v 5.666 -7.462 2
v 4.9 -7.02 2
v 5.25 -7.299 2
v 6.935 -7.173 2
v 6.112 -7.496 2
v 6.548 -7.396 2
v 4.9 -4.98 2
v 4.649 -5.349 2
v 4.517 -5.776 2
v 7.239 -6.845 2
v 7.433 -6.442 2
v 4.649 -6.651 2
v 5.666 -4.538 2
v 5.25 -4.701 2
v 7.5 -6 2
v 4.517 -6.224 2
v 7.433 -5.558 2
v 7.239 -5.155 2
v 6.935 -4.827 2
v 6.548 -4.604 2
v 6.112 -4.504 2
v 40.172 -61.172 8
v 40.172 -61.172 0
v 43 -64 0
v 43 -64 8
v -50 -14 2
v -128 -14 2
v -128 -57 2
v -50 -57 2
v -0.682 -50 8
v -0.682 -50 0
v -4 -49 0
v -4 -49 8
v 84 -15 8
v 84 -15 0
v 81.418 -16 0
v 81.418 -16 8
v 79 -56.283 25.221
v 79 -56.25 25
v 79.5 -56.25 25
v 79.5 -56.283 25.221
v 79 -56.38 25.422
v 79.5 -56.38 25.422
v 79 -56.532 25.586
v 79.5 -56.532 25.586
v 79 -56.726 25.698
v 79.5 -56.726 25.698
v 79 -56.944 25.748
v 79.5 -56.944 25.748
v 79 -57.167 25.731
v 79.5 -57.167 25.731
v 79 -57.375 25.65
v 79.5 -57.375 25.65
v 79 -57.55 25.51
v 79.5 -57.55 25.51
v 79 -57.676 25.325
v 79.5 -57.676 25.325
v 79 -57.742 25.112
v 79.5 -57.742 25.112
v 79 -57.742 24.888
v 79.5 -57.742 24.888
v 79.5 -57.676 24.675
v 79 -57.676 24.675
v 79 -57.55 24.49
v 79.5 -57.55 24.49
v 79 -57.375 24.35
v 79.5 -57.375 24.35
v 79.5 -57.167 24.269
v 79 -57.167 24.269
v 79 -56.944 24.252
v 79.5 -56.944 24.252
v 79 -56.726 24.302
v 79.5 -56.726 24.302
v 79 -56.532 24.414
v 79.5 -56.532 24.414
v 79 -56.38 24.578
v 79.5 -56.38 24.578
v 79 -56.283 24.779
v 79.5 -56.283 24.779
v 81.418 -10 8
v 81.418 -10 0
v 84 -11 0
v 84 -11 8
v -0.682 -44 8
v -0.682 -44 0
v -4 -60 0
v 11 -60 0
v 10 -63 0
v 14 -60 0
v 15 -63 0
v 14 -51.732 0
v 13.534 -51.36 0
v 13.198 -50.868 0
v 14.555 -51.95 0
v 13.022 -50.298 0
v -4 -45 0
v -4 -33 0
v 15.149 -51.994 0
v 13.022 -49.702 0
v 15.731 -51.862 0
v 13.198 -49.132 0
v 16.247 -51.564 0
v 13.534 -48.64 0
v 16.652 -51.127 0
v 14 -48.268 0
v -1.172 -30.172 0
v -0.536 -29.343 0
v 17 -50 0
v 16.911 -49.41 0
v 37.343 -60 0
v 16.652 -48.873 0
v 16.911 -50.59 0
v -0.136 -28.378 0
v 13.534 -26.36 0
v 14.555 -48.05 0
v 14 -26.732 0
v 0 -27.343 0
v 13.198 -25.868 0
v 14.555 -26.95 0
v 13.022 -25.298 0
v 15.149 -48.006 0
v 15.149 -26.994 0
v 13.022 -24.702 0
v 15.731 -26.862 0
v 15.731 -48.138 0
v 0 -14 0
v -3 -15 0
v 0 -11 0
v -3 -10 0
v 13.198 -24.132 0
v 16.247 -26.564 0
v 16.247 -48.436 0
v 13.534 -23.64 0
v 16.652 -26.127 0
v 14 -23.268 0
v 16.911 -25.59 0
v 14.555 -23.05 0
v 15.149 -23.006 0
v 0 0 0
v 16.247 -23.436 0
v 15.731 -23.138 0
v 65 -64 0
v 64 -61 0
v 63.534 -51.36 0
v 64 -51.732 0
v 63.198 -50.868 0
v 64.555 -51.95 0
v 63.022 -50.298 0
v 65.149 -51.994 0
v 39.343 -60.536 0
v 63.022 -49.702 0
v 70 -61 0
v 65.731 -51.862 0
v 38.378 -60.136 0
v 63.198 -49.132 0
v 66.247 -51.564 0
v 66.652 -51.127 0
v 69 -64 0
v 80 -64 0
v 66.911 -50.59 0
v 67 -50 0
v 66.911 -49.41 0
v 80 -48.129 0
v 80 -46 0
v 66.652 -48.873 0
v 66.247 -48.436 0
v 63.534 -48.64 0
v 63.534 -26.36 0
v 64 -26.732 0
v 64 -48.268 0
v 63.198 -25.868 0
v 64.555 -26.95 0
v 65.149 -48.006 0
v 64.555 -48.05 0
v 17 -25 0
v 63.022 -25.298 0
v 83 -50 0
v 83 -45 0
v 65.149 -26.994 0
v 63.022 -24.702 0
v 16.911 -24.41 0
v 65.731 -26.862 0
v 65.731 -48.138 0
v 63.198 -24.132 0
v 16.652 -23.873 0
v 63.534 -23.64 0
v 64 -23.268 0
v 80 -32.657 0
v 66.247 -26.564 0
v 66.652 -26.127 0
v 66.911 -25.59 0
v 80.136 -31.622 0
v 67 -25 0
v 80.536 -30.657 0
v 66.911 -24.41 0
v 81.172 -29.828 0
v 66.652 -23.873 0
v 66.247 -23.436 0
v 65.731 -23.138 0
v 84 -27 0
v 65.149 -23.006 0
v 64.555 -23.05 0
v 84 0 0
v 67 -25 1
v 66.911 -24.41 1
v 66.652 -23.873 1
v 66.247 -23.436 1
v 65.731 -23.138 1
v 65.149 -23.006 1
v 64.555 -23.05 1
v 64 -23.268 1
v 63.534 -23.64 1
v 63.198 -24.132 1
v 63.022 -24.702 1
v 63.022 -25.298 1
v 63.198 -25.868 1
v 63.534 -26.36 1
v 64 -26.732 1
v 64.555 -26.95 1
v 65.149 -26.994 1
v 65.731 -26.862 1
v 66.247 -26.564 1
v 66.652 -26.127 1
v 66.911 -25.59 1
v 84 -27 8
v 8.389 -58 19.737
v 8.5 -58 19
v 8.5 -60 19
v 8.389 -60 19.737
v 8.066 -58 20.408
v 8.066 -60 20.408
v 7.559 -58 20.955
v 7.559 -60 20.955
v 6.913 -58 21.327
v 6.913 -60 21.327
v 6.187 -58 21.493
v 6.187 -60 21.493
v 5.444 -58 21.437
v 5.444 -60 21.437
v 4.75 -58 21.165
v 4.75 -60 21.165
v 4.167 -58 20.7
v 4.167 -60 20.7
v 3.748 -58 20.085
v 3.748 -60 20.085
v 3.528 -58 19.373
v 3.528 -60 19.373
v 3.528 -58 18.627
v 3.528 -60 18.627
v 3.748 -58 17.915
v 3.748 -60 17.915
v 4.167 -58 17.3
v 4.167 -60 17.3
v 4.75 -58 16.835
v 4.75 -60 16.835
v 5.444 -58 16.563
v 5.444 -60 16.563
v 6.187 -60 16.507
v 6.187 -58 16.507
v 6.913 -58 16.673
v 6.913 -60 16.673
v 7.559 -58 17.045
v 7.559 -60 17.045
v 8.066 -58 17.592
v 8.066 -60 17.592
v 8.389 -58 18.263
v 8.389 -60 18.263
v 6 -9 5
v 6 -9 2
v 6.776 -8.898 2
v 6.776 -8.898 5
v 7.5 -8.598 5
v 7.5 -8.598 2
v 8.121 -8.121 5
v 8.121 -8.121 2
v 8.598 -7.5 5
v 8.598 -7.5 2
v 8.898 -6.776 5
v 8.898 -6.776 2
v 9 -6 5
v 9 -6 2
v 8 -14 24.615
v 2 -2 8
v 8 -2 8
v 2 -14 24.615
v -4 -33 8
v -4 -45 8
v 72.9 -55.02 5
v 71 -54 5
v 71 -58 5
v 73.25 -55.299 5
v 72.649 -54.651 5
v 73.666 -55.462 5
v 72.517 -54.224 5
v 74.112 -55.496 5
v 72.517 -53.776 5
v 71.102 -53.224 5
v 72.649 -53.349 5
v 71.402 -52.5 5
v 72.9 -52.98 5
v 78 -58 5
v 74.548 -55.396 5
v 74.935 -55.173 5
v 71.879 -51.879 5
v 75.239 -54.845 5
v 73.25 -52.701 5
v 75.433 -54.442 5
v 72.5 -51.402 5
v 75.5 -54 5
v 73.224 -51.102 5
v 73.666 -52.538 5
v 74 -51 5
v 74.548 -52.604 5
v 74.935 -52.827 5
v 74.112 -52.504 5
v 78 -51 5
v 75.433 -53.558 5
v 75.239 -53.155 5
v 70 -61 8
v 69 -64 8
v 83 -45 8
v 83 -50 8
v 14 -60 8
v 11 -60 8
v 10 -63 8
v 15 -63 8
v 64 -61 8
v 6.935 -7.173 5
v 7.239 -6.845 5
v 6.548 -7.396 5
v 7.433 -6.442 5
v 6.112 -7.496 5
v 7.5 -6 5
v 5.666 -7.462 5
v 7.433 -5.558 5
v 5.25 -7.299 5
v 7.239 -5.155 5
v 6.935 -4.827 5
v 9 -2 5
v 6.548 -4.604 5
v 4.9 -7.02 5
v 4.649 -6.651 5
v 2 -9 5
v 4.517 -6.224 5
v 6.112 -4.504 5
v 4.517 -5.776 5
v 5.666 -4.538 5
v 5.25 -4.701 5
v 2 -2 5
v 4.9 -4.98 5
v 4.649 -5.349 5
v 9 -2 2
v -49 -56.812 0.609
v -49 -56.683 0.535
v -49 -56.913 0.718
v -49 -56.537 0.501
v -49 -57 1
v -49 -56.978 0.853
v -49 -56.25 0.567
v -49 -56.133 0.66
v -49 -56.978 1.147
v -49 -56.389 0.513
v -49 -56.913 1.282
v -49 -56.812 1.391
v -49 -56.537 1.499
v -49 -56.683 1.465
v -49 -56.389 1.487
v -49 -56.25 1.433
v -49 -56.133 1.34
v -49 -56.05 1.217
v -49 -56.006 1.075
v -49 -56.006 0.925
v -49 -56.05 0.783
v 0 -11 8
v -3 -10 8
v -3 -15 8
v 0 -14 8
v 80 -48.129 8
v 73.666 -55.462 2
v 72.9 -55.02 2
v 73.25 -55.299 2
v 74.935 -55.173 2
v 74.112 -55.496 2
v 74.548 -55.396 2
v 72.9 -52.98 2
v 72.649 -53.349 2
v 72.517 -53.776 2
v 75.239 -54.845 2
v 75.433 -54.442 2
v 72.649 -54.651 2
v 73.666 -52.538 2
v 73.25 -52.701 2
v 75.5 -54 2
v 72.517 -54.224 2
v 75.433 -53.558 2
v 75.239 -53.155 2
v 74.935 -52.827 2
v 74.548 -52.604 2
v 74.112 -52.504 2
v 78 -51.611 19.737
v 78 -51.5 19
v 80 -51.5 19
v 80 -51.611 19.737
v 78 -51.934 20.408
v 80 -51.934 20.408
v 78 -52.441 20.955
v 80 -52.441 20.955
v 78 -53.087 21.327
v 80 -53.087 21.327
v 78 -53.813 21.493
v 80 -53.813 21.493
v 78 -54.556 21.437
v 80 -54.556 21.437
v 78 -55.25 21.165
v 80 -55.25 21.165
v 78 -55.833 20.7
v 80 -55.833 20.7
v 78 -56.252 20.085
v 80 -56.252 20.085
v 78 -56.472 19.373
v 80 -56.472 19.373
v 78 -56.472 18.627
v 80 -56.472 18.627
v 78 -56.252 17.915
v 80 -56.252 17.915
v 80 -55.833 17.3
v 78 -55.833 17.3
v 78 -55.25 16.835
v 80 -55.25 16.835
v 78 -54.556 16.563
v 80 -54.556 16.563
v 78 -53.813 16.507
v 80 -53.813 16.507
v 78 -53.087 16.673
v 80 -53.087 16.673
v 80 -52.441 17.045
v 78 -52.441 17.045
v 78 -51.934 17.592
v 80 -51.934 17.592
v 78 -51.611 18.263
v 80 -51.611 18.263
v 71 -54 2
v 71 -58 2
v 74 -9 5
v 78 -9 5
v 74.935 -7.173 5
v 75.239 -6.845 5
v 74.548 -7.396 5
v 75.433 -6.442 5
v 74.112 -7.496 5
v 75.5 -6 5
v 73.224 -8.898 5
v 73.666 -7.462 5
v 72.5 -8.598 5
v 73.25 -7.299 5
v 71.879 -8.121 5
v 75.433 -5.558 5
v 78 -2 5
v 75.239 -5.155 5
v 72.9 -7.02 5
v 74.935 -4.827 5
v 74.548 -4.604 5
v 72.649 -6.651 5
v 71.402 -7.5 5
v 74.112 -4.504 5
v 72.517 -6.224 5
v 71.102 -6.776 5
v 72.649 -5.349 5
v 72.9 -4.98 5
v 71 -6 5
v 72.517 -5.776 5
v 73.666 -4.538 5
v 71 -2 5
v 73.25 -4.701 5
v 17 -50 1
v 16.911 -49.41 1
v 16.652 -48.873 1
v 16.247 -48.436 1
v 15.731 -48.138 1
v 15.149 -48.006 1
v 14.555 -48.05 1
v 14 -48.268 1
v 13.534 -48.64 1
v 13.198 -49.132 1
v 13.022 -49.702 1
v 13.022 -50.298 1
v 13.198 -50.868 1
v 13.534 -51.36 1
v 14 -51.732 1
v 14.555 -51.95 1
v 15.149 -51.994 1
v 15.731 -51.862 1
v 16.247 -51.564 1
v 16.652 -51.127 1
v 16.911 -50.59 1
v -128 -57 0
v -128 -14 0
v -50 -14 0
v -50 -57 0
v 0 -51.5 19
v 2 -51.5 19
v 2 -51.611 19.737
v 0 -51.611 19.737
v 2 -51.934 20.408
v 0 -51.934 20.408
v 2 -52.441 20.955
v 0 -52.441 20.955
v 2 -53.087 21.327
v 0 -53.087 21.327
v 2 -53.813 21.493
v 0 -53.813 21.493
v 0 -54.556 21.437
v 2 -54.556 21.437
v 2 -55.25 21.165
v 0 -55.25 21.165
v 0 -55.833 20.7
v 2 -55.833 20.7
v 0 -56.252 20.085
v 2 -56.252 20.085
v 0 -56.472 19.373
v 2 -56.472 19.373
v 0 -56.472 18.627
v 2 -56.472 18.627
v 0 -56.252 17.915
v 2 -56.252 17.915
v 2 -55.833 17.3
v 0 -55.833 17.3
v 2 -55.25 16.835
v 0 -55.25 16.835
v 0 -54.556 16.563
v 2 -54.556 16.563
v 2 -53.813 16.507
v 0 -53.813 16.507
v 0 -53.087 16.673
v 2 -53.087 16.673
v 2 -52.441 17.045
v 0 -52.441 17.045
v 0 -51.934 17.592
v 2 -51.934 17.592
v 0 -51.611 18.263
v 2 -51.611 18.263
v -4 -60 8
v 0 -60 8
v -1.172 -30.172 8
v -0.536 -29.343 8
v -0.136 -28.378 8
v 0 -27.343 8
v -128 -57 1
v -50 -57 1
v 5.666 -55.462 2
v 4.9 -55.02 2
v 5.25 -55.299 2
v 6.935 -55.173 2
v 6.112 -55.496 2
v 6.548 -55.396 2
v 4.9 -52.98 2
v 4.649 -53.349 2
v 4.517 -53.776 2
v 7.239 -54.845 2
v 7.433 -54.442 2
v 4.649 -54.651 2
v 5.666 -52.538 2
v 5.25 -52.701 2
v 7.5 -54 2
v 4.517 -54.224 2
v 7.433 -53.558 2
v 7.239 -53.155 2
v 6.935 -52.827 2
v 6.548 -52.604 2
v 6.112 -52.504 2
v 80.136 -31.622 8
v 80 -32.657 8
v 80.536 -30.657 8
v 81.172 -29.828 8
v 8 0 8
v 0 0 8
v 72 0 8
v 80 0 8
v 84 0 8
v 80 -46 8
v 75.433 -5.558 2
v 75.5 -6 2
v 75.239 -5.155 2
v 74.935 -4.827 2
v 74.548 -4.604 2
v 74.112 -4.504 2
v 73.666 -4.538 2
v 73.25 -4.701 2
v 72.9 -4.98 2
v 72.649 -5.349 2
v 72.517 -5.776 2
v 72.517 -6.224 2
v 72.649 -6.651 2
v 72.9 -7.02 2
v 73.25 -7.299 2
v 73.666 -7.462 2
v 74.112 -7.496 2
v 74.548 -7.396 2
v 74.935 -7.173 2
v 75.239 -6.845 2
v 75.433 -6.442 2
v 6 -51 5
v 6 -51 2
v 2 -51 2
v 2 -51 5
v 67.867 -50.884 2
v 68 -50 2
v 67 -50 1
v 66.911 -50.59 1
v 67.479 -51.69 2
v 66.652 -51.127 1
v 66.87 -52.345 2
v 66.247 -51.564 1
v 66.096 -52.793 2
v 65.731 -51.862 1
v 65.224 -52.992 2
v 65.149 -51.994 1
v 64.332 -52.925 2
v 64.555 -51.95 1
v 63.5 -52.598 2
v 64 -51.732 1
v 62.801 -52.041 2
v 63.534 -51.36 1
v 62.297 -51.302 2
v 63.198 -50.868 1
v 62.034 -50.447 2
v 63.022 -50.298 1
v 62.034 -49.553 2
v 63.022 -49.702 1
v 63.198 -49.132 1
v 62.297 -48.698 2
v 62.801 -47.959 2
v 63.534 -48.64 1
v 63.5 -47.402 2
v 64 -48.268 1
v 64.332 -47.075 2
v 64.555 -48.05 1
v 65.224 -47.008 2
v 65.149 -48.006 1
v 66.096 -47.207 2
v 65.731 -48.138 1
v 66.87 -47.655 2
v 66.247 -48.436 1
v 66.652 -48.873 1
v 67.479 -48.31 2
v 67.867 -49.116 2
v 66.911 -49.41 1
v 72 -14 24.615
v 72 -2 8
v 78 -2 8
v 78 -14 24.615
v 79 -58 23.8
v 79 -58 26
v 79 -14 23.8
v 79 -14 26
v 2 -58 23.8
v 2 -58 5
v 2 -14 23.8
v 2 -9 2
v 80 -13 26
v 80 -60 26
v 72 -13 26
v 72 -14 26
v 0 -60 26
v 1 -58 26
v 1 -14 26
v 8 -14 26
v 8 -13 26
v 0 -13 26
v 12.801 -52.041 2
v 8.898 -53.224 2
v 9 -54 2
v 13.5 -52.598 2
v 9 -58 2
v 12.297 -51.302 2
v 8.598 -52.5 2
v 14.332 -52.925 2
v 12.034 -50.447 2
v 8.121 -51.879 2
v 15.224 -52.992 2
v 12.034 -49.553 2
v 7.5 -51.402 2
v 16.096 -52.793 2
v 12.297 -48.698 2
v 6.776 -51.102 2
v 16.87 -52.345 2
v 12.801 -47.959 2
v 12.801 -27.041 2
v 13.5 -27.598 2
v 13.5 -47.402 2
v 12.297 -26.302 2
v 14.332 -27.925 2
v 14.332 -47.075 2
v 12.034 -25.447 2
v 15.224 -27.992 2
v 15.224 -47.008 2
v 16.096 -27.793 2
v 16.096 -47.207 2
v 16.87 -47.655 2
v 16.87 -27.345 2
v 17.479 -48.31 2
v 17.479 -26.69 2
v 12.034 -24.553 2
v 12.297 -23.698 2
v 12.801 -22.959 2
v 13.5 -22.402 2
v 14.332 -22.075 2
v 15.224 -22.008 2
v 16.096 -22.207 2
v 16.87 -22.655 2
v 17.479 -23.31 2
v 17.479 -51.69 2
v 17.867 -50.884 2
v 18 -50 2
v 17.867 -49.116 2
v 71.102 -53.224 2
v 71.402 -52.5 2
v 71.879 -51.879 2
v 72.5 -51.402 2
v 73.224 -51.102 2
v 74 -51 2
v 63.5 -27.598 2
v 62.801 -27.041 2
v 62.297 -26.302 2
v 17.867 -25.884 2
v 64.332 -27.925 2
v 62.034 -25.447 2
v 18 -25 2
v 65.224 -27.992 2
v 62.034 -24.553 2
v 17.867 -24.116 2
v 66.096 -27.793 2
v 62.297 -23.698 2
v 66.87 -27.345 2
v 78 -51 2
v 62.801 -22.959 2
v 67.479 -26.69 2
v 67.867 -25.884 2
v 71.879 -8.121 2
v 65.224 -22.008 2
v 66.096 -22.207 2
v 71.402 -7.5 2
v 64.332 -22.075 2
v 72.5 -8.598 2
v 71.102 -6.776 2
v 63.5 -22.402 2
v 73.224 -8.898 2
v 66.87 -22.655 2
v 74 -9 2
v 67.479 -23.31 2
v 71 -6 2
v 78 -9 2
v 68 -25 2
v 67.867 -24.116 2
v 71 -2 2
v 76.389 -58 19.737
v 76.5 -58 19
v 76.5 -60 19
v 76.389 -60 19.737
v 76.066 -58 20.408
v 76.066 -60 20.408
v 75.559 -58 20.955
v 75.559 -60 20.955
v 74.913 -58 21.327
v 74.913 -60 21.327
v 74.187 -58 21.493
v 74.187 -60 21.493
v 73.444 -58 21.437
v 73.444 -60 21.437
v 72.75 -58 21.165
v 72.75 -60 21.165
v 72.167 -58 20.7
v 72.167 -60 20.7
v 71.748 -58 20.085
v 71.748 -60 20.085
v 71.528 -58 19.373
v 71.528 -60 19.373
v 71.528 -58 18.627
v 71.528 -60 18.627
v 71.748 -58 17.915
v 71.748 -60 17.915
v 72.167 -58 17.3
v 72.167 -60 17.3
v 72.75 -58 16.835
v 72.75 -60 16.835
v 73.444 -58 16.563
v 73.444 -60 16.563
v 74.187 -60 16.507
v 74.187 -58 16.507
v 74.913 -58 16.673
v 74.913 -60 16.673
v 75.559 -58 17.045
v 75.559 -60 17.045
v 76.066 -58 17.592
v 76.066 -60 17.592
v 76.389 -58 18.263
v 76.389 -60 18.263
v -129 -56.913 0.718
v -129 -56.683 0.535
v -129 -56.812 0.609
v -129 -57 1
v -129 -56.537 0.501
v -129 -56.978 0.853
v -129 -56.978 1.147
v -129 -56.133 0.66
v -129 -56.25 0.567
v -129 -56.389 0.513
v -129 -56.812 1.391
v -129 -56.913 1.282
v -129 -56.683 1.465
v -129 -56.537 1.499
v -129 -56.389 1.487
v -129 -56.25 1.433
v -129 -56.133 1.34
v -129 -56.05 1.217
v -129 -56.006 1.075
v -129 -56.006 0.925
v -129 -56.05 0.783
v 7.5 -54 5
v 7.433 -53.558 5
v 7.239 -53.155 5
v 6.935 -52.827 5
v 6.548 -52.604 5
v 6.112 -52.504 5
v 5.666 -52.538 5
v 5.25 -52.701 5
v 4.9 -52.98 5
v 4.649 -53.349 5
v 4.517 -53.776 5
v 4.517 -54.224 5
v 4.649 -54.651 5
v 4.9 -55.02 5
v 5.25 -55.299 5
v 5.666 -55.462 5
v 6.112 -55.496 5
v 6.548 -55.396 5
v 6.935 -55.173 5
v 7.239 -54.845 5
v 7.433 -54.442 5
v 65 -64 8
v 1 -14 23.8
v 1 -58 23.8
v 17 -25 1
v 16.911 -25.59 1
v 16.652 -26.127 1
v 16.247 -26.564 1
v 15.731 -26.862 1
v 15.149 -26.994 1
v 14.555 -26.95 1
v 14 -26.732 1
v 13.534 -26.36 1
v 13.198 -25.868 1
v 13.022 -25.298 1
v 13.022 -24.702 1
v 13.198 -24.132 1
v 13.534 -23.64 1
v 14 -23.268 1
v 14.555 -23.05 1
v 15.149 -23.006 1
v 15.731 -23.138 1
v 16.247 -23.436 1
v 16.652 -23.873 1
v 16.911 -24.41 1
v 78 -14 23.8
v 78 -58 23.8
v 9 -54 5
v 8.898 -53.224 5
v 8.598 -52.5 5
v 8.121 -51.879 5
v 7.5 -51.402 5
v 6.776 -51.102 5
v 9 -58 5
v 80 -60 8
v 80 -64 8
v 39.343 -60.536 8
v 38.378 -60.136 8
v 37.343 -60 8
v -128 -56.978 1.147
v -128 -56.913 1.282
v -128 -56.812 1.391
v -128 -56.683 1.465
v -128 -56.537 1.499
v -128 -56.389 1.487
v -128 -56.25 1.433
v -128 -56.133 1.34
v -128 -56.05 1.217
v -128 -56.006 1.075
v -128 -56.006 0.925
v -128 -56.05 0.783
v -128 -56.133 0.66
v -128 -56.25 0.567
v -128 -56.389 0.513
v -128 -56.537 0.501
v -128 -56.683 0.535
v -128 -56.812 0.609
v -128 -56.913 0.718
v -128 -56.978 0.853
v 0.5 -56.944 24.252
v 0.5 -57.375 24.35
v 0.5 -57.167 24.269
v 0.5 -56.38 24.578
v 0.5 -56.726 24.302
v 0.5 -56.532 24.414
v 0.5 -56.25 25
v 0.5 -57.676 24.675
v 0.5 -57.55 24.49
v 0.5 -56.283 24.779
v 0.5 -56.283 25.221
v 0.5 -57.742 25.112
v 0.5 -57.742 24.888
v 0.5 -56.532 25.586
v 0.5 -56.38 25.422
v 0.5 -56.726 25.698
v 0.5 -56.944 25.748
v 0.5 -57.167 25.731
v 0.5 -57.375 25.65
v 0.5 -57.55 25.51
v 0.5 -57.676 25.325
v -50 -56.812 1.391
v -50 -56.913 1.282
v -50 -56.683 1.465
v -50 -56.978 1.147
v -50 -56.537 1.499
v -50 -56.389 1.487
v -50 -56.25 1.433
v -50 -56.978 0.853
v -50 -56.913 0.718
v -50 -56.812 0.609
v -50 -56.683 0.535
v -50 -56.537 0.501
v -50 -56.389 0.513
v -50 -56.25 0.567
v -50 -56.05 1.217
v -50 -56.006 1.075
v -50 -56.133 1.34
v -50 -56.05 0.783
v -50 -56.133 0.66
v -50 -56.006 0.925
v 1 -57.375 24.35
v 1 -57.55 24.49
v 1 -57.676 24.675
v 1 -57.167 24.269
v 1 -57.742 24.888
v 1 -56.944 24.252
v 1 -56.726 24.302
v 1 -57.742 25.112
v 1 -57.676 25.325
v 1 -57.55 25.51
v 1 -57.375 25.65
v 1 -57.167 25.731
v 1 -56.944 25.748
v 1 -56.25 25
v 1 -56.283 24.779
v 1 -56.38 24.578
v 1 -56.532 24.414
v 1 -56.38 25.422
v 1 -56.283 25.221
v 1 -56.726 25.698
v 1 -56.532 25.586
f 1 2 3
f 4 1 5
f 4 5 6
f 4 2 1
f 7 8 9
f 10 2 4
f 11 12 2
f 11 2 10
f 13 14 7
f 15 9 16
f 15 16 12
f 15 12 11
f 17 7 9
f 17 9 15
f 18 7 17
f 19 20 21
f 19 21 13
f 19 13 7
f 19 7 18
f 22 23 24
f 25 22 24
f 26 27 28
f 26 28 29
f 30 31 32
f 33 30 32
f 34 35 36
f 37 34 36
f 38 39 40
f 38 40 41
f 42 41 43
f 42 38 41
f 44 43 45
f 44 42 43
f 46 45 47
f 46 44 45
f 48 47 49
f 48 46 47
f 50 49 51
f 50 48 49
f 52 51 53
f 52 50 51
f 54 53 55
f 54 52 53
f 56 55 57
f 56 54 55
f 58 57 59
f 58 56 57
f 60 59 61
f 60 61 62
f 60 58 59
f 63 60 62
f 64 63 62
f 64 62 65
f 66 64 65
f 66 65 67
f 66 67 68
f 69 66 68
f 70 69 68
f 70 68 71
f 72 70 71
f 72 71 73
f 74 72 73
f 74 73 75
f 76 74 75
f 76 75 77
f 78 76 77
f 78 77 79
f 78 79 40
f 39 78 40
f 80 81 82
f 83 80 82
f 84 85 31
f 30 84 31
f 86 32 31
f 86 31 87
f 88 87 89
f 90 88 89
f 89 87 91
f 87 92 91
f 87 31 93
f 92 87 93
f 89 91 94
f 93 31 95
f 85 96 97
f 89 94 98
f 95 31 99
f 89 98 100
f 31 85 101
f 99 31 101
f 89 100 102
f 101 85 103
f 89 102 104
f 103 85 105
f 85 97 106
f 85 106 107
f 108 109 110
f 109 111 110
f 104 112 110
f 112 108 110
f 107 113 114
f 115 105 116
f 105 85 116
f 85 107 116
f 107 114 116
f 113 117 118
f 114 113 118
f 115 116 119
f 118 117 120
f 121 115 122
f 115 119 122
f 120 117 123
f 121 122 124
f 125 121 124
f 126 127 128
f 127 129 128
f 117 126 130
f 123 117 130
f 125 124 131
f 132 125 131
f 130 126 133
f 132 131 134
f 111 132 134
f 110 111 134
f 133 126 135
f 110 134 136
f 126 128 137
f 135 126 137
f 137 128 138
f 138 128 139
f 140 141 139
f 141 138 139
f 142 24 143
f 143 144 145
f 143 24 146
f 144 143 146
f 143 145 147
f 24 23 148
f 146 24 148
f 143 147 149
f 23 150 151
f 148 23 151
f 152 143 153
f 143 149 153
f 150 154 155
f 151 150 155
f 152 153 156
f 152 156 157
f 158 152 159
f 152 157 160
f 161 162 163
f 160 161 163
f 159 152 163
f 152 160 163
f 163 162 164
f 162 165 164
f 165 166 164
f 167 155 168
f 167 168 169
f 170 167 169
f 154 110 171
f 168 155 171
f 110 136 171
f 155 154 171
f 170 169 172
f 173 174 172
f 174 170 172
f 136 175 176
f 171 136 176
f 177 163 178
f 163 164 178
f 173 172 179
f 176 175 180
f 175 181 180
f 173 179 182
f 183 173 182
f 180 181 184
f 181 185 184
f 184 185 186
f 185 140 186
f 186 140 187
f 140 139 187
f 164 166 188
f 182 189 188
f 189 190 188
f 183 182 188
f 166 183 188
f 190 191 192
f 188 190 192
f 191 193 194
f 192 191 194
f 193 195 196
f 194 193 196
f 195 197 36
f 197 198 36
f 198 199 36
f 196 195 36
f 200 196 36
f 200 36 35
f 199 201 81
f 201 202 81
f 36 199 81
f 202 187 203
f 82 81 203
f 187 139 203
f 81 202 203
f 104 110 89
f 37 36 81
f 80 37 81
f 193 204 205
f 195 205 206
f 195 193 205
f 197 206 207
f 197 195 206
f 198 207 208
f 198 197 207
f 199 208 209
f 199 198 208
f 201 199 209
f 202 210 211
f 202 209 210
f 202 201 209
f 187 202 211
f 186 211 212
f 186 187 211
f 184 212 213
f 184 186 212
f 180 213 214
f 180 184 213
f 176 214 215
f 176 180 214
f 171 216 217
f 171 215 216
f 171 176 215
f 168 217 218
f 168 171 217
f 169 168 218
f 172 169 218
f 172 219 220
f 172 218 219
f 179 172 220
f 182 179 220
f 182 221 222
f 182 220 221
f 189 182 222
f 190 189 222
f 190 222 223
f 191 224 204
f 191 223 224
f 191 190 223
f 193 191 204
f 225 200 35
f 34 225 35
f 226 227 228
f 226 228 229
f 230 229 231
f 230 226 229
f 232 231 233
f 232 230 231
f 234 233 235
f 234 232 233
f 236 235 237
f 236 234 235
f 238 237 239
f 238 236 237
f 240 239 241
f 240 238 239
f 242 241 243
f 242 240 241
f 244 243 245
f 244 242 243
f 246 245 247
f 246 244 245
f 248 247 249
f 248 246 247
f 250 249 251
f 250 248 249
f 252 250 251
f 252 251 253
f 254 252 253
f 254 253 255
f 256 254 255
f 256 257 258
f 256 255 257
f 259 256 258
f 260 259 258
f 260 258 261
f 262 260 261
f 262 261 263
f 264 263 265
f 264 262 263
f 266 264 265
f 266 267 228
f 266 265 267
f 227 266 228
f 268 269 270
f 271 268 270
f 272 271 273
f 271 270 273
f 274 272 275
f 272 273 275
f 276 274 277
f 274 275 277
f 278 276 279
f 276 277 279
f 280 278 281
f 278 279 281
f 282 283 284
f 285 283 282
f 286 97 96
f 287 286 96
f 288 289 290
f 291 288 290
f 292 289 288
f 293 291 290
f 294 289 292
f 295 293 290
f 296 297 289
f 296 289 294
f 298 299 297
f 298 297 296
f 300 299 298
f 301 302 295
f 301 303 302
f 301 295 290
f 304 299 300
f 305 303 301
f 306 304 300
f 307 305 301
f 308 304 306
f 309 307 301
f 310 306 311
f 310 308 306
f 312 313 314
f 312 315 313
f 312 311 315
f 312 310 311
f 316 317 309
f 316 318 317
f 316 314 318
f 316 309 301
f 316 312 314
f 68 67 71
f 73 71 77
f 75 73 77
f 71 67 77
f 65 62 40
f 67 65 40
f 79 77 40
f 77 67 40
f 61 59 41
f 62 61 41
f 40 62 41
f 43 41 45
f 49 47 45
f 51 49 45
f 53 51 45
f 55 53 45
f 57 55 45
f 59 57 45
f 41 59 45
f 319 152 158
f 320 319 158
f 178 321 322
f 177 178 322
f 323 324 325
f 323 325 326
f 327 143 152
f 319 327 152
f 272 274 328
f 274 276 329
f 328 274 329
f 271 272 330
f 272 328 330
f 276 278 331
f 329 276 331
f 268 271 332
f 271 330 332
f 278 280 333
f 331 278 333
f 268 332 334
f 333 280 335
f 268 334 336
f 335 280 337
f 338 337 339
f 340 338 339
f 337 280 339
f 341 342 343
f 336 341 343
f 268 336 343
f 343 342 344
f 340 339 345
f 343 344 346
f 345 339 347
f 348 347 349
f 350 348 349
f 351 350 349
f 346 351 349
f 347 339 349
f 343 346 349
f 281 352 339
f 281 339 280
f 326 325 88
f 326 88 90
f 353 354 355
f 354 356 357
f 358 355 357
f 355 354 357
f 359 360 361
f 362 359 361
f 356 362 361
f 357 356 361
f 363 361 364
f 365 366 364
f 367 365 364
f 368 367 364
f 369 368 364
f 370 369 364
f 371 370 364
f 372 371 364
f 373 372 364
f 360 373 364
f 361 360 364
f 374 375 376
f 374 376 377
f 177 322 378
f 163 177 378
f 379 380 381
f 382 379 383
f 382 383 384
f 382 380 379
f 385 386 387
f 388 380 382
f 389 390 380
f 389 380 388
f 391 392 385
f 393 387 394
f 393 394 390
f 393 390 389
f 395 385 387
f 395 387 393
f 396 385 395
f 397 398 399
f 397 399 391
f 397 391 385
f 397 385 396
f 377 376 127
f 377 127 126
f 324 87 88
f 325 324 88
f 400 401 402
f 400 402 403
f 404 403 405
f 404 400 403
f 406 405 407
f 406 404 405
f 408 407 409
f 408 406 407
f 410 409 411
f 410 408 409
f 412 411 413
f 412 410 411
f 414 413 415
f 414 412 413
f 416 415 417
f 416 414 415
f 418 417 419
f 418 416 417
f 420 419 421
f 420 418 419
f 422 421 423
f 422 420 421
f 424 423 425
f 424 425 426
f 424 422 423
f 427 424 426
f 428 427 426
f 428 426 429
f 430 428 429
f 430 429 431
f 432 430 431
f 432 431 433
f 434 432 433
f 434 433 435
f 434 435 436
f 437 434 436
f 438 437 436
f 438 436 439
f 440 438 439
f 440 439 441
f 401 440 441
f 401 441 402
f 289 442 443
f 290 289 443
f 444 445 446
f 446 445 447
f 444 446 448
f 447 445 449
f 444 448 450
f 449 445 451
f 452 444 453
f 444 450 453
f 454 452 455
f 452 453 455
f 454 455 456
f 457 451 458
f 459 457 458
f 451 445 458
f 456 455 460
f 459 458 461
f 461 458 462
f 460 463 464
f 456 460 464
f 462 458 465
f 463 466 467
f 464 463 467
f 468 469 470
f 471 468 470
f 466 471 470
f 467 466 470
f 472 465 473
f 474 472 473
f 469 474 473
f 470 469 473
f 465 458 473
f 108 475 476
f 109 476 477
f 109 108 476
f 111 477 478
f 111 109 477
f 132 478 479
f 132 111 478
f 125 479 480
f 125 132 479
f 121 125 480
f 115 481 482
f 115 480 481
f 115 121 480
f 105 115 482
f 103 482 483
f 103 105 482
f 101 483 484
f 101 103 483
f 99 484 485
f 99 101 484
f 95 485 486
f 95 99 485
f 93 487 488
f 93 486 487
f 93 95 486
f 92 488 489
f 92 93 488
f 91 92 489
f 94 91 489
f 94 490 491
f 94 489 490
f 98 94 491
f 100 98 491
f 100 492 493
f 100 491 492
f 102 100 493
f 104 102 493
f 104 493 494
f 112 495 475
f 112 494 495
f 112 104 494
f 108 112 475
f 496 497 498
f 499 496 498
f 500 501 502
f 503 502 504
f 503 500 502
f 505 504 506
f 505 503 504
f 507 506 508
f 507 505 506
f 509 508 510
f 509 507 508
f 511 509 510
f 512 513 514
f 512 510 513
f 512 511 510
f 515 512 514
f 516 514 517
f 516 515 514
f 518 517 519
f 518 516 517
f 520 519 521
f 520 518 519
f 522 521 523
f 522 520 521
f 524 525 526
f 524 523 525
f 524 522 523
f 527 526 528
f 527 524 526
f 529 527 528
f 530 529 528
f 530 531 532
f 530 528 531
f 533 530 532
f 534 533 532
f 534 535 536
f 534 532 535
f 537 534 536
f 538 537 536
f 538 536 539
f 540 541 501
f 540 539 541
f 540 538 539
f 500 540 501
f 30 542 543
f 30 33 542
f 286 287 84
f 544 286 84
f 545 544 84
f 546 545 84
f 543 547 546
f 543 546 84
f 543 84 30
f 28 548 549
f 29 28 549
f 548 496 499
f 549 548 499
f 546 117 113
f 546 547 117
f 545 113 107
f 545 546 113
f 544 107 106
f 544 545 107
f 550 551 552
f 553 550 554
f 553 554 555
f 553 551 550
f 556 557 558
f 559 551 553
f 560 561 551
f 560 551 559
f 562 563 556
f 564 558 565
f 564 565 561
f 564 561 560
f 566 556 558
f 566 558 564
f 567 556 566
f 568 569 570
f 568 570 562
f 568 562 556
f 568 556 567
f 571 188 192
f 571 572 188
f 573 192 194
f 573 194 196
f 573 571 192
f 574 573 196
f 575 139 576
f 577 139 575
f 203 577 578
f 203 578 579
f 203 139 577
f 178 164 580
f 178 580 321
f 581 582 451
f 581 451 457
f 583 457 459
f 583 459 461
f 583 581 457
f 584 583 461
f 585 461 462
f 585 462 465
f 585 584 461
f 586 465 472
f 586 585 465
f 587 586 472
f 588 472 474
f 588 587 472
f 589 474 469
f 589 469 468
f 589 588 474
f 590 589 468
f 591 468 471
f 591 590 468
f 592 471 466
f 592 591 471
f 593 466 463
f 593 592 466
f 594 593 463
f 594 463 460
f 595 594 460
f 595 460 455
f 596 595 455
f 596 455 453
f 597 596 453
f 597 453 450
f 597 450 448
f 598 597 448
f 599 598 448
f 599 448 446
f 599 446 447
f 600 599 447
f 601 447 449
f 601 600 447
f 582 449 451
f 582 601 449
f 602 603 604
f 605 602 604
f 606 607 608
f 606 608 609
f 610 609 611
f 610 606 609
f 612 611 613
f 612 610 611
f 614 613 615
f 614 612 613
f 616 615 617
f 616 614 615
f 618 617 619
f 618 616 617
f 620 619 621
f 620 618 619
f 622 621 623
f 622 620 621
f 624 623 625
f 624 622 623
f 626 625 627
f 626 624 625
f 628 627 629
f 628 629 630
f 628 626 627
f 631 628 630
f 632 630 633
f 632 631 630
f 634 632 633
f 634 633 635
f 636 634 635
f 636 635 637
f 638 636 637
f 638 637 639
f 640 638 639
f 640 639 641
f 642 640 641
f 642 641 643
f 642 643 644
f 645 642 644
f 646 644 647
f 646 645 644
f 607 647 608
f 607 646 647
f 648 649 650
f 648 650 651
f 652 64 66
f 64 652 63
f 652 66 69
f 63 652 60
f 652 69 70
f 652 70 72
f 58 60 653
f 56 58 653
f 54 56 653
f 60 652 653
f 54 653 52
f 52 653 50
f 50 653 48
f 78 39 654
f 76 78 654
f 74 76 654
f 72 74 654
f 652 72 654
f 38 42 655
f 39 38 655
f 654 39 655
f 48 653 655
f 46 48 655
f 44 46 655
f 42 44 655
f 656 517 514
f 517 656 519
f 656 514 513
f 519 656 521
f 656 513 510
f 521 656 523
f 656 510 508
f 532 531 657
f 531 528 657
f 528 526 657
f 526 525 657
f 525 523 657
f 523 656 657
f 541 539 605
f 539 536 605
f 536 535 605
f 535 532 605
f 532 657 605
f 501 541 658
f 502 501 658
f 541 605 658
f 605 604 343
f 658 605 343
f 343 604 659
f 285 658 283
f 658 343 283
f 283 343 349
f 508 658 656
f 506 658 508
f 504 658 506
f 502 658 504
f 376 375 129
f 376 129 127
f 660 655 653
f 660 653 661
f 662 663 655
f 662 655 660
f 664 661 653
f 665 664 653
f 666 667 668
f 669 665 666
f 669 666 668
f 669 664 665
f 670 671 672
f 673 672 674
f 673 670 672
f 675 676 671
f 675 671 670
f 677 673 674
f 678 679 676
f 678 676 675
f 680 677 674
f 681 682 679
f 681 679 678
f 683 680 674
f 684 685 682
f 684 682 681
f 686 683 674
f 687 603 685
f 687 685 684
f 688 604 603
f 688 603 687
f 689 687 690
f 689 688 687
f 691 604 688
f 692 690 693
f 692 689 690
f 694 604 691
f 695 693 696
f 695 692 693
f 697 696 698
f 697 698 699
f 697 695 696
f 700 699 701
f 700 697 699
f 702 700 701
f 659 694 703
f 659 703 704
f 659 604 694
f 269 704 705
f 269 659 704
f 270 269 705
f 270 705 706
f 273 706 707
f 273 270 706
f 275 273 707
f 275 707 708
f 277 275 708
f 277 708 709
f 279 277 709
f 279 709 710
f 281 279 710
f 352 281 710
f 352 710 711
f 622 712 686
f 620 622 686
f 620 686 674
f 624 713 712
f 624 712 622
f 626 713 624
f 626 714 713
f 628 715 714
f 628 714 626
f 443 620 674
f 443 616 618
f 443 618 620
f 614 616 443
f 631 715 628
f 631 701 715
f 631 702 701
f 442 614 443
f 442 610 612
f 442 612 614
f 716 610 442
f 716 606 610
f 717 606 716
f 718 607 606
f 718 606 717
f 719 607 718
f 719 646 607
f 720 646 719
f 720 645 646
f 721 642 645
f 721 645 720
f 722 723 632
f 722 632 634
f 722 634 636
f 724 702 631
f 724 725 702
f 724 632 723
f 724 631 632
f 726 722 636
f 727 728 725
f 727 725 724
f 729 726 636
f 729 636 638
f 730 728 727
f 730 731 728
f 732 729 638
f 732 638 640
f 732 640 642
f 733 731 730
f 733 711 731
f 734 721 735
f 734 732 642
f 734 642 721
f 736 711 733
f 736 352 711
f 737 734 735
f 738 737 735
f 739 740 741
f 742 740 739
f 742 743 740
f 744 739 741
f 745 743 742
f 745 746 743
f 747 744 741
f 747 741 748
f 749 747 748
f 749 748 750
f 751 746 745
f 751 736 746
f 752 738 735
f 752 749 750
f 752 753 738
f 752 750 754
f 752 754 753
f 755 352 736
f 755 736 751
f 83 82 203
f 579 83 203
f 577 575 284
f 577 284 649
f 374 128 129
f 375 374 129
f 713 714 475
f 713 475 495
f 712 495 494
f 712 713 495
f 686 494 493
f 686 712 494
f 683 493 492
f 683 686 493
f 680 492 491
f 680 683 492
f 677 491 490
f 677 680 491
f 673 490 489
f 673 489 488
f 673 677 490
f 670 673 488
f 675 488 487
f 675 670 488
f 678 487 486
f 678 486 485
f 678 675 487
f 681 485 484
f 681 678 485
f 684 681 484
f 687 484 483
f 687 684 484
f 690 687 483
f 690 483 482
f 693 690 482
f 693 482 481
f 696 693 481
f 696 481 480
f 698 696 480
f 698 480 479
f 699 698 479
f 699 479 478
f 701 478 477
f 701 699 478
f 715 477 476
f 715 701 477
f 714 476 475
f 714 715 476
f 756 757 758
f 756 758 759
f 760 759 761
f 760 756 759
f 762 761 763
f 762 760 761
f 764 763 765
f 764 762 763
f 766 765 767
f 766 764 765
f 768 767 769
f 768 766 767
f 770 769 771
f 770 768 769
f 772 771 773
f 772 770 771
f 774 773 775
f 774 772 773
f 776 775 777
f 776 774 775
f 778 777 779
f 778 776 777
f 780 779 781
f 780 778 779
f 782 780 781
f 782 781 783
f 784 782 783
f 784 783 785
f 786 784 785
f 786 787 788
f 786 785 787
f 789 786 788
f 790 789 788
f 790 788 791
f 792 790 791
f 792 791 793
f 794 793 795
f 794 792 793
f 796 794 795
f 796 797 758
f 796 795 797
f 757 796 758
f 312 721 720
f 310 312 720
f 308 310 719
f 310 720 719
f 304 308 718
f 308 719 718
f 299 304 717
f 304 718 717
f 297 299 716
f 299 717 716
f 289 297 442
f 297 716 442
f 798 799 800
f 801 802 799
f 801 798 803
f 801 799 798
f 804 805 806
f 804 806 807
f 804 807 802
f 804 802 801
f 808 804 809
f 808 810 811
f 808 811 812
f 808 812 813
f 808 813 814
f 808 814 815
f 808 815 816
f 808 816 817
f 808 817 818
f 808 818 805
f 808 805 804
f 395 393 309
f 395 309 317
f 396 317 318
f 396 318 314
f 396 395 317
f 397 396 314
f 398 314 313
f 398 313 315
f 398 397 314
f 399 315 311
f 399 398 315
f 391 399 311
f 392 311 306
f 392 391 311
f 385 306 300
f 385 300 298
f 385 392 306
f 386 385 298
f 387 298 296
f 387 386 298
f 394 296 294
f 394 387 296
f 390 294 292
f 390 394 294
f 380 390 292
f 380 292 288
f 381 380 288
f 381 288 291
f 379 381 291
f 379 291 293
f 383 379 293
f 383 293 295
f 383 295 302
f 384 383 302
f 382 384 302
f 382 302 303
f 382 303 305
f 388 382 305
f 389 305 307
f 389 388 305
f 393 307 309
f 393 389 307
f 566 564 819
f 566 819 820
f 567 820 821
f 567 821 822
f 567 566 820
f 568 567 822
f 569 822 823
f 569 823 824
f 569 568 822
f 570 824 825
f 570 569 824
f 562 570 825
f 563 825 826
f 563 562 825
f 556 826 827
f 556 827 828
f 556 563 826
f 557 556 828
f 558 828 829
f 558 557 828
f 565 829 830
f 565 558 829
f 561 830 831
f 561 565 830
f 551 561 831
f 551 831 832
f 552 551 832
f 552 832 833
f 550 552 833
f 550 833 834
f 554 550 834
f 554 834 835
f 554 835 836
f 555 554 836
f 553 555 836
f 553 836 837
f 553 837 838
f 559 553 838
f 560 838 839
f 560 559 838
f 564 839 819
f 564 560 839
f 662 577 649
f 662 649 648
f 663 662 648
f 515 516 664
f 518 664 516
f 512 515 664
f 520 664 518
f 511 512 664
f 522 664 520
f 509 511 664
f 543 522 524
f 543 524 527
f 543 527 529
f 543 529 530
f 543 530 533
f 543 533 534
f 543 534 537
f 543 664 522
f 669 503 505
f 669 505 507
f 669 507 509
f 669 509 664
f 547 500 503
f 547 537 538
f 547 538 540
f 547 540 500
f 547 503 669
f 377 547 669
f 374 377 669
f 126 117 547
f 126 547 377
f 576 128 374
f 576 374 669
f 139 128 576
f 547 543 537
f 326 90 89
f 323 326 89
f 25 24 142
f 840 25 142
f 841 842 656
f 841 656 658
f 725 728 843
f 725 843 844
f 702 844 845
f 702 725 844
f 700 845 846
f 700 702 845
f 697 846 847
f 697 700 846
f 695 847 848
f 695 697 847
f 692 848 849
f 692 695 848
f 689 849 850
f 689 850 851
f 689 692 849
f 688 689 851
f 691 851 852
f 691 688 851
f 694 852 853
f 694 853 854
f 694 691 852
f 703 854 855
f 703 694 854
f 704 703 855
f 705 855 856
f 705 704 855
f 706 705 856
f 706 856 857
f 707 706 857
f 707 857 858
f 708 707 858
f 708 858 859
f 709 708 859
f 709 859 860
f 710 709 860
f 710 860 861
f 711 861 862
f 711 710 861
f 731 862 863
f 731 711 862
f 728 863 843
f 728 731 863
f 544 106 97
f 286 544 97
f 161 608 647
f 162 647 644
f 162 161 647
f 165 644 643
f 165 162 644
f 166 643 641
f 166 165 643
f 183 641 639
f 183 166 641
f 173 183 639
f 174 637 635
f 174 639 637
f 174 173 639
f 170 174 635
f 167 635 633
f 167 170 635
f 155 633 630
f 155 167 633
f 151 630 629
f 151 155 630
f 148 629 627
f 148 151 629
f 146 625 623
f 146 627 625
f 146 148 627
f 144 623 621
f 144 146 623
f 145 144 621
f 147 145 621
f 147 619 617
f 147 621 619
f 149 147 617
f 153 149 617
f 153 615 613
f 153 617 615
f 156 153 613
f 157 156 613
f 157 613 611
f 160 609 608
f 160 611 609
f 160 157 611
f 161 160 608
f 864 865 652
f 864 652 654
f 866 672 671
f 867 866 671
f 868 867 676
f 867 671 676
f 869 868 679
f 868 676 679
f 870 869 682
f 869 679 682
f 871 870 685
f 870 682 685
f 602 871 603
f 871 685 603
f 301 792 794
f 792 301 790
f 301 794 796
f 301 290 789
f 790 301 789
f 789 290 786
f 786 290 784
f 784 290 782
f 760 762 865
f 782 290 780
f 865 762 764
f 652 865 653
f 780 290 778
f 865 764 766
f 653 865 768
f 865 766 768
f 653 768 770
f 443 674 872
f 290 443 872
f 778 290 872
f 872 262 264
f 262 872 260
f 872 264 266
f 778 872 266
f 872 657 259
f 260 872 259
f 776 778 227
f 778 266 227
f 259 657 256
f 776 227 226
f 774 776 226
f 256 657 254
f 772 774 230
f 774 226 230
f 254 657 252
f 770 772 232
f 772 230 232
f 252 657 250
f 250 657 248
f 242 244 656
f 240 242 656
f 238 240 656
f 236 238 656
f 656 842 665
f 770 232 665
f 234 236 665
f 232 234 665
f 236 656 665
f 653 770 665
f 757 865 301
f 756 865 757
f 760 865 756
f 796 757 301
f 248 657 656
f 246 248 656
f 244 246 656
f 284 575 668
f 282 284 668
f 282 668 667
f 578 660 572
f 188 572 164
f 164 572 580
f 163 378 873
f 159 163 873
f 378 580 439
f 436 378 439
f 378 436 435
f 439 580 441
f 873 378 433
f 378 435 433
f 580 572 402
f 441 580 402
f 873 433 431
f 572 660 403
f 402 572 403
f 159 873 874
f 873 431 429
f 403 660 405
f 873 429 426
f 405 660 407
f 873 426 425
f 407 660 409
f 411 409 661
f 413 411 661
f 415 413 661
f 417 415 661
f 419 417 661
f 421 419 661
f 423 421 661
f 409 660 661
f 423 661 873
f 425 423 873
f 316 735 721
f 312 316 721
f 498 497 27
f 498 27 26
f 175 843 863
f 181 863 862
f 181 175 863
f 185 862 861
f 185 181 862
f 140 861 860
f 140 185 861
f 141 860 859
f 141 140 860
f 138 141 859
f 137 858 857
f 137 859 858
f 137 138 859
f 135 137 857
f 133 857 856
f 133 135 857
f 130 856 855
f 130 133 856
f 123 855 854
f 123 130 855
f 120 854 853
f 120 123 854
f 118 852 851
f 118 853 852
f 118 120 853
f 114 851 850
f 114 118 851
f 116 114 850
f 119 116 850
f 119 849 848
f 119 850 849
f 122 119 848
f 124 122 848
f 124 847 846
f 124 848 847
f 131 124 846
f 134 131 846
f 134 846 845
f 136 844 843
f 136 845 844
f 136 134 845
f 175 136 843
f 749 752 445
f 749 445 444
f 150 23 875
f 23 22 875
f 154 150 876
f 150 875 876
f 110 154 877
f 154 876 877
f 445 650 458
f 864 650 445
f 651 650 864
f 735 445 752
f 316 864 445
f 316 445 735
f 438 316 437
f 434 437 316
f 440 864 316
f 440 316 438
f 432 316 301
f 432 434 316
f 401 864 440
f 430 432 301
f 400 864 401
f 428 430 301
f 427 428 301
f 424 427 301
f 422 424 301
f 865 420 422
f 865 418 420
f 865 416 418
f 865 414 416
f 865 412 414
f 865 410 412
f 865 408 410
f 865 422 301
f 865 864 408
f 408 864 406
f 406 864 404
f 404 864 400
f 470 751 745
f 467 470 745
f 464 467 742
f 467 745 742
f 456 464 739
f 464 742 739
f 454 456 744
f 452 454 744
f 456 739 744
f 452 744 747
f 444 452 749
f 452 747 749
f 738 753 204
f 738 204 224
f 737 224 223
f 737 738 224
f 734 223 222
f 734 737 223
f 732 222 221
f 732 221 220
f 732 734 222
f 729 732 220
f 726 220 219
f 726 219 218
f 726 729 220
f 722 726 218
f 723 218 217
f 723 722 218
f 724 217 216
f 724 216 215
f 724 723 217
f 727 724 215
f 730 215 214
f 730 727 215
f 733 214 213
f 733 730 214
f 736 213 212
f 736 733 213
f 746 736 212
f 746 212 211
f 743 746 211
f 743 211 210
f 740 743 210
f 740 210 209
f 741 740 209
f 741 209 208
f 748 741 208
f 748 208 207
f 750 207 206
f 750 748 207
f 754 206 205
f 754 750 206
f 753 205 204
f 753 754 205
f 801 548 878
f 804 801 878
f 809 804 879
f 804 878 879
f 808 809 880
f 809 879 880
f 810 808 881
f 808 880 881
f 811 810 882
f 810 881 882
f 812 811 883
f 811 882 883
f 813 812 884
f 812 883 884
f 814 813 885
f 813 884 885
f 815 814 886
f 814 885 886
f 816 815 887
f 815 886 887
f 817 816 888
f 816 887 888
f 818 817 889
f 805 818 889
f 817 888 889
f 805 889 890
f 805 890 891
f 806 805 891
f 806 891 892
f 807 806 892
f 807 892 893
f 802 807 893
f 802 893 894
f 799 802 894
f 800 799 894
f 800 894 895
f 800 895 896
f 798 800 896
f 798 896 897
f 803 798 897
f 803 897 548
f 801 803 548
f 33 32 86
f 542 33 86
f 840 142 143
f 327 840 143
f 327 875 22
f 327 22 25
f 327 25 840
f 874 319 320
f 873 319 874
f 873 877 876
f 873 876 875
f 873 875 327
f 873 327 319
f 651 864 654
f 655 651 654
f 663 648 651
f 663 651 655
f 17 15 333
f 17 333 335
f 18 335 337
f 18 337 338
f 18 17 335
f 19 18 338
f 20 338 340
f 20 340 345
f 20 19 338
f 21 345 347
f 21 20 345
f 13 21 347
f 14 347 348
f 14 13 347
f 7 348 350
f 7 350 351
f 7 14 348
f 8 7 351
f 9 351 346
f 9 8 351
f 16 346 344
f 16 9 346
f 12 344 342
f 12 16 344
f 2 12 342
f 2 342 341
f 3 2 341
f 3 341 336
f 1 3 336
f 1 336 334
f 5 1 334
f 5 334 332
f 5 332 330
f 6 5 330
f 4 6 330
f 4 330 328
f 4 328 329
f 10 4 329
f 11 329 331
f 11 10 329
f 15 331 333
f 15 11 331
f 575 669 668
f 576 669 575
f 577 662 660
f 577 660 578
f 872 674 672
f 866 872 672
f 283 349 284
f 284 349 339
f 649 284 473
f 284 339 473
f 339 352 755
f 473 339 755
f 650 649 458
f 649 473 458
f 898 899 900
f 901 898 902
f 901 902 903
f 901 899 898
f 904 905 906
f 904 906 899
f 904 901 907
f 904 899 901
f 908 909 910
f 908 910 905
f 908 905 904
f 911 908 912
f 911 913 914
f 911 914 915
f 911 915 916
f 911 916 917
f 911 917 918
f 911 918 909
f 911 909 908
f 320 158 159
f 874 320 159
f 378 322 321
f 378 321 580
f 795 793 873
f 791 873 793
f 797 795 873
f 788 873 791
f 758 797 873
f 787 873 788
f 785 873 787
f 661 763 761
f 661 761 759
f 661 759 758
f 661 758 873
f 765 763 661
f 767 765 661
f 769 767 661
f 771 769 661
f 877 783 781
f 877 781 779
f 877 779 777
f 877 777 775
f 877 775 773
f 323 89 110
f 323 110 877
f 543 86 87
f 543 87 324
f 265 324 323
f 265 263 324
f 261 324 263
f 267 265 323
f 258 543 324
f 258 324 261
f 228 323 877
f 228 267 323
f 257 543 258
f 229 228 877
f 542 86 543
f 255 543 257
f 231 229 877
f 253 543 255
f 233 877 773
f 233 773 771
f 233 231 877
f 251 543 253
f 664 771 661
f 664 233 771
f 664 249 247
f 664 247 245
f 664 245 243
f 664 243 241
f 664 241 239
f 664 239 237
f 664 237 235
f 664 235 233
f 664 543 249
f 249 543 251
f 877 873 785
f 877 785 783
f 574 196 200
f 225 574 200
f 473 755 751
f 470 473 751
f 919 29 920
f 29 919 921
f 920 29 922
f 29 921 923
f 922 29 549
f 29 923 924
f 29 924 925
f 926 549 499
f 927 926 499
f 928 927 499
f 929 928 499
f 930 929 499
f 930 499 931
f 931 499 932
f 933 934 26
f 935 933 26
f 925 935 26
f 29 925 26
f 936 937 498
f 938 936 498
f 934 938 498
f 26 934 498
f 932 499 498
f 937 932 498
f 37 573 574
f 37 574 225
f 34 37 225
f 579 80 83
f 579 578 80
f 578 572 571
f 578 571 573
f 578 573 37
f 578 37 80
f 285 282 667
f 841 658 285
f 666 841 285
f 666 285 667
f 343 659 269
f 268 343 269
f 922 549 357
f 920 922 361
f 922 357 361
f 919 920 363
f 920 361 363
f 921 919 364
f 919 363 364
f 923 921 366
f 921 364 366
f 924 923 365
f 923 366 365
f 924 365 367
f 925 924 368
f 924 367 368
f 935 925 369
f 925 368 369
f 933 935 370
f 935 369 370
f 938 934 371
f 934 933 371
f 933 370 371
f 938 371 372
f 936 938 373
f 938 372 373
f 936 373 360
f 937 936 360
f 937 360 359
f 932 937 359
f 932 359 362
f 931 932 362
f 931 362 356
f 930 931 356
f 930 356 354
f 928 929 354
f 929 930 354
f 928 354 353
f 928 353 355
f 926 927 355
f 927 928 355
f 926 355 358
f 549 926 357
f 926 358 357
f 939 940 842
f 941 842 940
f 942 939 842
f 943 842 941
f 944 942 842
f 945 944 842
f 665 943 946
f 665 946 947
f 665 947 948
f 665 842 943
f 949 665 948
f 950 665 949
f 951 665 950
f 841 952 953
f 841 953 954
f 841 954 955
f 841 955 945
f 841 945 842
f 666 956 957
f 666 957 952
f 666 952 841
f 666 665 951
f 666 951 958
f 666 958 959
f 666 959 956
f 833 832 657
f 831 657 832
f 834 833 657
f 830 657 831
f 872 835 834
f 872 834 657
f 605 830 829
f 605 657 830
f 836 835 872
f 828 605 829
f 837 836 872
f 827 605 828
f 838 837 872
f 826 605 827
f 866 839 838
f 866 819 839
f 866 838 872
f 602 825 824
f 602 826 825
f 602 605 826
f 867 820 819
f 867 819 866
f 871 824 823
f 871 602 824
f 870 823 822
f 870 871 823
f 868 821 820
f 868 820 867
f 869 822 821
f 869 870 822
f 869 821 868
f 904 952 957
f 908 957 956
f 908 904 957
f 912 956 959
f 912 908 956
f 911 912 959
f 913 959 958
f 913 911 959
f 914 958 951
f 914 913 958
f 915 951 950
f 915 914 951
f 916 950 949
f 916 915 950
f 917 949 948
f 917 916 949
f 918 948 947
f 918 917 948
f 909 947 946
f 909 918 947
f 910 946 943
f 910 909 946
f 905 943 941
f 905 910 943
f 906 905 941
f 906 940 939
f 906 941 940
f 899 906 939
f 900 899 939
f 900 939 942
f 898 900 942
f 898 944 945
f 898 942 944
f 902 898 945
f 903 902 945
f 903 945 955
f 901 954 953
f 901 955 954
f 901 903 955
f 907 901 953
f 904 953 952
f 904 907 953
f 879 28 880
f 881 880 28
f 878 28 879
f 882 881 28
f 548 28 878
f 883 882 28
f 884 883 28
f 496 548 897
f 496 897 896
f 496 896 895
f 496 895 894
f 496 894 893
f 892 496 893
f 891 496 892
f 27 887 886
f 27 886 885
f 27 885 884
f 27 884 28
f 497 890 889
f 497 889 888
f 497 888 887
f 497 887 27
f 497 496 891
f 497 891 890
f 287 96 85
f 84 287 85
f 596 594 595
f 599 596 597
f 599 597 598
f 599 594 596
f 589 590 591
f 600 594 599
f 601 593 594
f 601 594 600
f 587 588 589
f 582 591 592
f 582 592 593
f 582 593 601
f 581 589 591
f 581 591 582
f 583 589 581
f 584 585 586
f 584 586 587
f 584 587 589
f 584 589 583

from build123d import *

# Parameters (mm, degrees)
SKETCH013_W   = 78
SKETCH013_H   = 43
PAD013_DEPTH  = 2
SKETCH014_R   = 0.5
PAD014_DEPTH  = 80
SKETCH015_R   = 2
PAD015_DEPTH  = 10
SKETCH012_R   = 2.5
PAD012_DEPTH  = 40
PAD011_DEPTH  = 8
FILLET_R      = 0.5
SKETCH010_R   = 2.5
PAD010_DEPTH  = 80
SKETCH009_R   = 0.75
PAD009_DEPTH  = 79
SKETCH004_W   = 44
SKETCH004_H   = 2.2
PAD004_DEPTH  = 78
SKETCH002_R   = 1.5
PAD002_DEPTH  = 3
SKETCH001_W   = 80
SKETCH001_H   = 60
SKETCH001_W_2 = 76
SKETCH001_H_2 = 56
PAD001_DEPTH  = 6
SKETCH_W      = 80
SKETCH_H      = 60
PAD_DEPTH     = 2
PAD005_DEPTH  = 2
PAD007_DEPTH  = 6
SKETCH008_W   = 2
SKETCH008_H   = 18
PAD008_DEPTH  = 76
PAD006_DEPTH  = 6
PAD003_DEPTH  = 2
FILLET001_R   = 4
CHAMFER_SIZE  = 1


with BuildPart() as pad013:
    # Sketch013 → Pad013 (new body)
    with BuildSketch(Plane.XY):
        with Locations((-89, -35.5)):
            Rectangle(SKETCH013_W, SKETCH013_H)
    extrude(amount=PAD013_DEPTH)


with BuildPart() as tampa:
    # Sketch014 → Pad014 (new body)
    with BuildSketch(Plane(origin=(-49, 0, 0), x_dir=(0, -1, 0), z_dir=(-1, 0, 0))):
        with Locations((56.5, 1)):
            Circle(SKETCH014_R)
    extrude(amount=PAD014_DEPTH)

    # Fusion004: union Pad013
    add(pad013.part)


with BuildPart() as parafusos:
    # Sketch015 → Pad015 (new body)
    with BuildSketch(Plane.XY):
        with Locations((15, -25)):
            Circle(SKETCH015_R)
        with Locations((65, -25)):
            Circle(SKETCH015_R)
        with Locations((15, -50)):
            Circle(SKETCH015_R)
        with Locations((65, -50)):
            Circle(SKETCH015_R)
    extrude(amount=PAD015_DEPTH)


with BuildPart() as pad012:
    # Sketch012 → Pad012 (new body)
    with BuildSketch(Plane.XZ.offset(30)):
        with Locations((6, 19)):
            Circle(SKETCH012_R)
        with Locations((74, 19)):
            Circle(SKETCH012_R)
    extrude(amount=PAD012_DEPTH)


with BuildPart() as pad011:
    # Sketch011 → Pad011 (new body)
    with BuildSketch(Plane.XY):
        Polygon((0, -11), (-3, -10), (-3, -15), (0, -14), align=None)
        Polygon((0, -29), (-4, -33), (-4, -45), (-0.682166, -44), (-0.682166, -50), (-4, -49), (-4, -60), (0, -60), align=None)
        Polygon((11, -60), (10, -63), (15, -63), (14, -60), align=None)
        Polygon((39, -60), (43, -64), (65, -64), (64, -61), (70, -61), (69, -64), (80, -64), (80, -60), align=None)
        Polygon((80, 0), (80, -31), (84, -27), (84, -15), (81.417573, -16), (81.417573, -10), (84, -11), (84, 0), align=None)
        Polygon((80, -46), (83, -45), (83, -50), (80, -48.129196), align=None)
    extrude(amount=PAD011_DEPTH)


with BuildPart() as fillet_body:
    # Fillet base: copy of Pad011
    add(pad011.part)

    # Fillet
    fillet_edges = [fillet_body.edges().sort_by_distance(p)[0] for p in [
        (-3, -10, 4),
        (-3, -15, 4),
        (-4, -45, 4),
        (-4, -49, 4),
        (10, -63, 4),
        (15, -63, 4),
        (65, -64, 4),
        (69, -64, 4),
        (83, -50, 4),
        (83, -45, 4),
        (84, -15, 4),
        (84, -11, 4),
    ]]
    fillet(fillet_edges, radius=FILLET_R)


with BuildPart() as pad010:
    # Sketch010 → Pad010 (new body)
    with BuildSketch(Plane.YZ):
        with Locations((-54, 19)):
            Circle(SKETCH010_R)
    extrude(amount=PAD010_DEPTH)


with BuildPart() as pad009:
    # Sketch009 → Pad009 (new body)
    with BuildSketch(Plane.YZ.offset(0.5)):
        with Locations((-57, 25)):
            Circle(SKETCH009_R)
    extrude(amount=PAD009_DEPTH)


with BuildPart() as corte_da_tampa:
    # Sketch004 → Pad004 (new body)
    with BuildSketch(Plane.YZ.offset(1)):
        with Locations((-36, 24.9)):
            Rectangle(SKETCH004_W, SKETCH004_H)
    extrude(amount=PAD004_DEPTH)


with BuildPart() as pad002:
    # Sketch002 → Pad002 (new body)
    with BuildSketch(Plane.XY.offset(2)):
        with BuildLine():
            Line((9, 0), (9, -6))
            ThreePointArc((6, -9), (8.12132, -8.12132), (9, -6))
            Line((0, -9), (6, -9))
            Line((0, 0), (0, -9))
            Line((0, 0), (9, 0))
        make_face()
        with Locations((6, -6)):
            Circle(SKETCH002_R, mode=Mode.SUBTRACT)
        with BuildLine():
            Line((71, 0), (80, 0))
            Line((80, 0), (80, -9))
            Line((80, -9), (74, -9))
            ThreePointArc((71, -6), (71.87868, -8.12132), (74, -9))
            Line((71, 0), (71, -6))
        make_face()
        with Locations((74, -6)):
            Circle(SKETCH002_R, mode=Mode.SUBTRACT)
        with BuildLine():
            Line((6, -51), (0, -51))
            Line((0, -51), (0, -60))
            Line((0, -60), (9, -60))
            Line((9, -60), (9, -54))
            ThreePointArc((9, -54), (8.12132, -51.87868), (6, -51))
        make_face()
        with Locations((6, -54)):
            Circle(SKETCH002_R, mode=Mode.SUBTRACT)
        with BuildLine():
            Line((71, -54), (71, -60))
            Line((71, -60), (80, -60))
            Line((80, -60), (80, -51))
            Line((80, -51), (74, -51))
            ThreePointArc((74, -51), (71.87868, -51.87868), (71, -54))
        make_face()
        with Locations((74, -54)):
            Circle(SKETCH002_R, mode=Mode.SUBTRACT)
    extrude(amount=PAD002_DEPTH)


with BuildPart() as pad001:
    # Sketch001 → Pad001 (new body)
    with BuildSketch(Plane.XY.offset(2)):
        with Locations((40, -30)):
            Rectangle(SKETCH001_W, SKETCH001_H)
        with Locations((40, -30)):
            Rectangle(SKETCH001_W_2, SKETCH001_H_2, mode=Mode.SUBTRACT)
    extrude(amount=PAD001_DEPTH)


with BuildPart() as base:
    # Sketch → Pad (new body)
    with BuildSketch(Plane.XY):
        with Locations((40, -30)):
            Rectangle(SKETCH_W, SKETCH_H)
    extrude(amount=PAD_DEPTH)


with BuildPart() as pad005:
    # Sketch005 → Pad005 (new body)
    with BuildSketch(Plane.YZ.offset(78)):
        Polygon((0, 8), (-60, 8), (-60, 26), (-13, 26), align=None)
    extrude(amount=PAD005_DEPTH)


with BuildPart() as pad007:
    # Sketch007 → Pad007 (new body)
    with BuildSketch(Plane.YZ.offset(72)):
        Polygon((0, 8), (-2, 8), (-15, 26), (-13, 26), align=None)
    extrude(amount=PAD007_DEPTH)


with BuildPart() as pad008:
    # Sketch008 → Pad008 (new body)
    with BuildSketch(Plane.YZ.offset(2)):
        with Locations((-59, 17)):
            Rectangle(SKETCH008_W, SKETCH008_H)
    extrude(amount=PAD008_DEPTH)


with BuildPart() as pad006:
    # Sketch006 → Pad006 (new body)
    with BuildSketch(Plane.YZ.offset(2)):
        Polygon((0, 8), (-2, 8), (-15, 26), (-13, 26), align=None)
    extrude(amount=PAD006_DEPTH)


with BuildPart() as cut002:
    # Sketch003 → Pad003 (new body)
    with BuildSketch(Plane.YZ):
        Polygon((0, 8), (-60, 8), (-60, 26), (-13, 26), align=None)
    extrude(amount=PAD003_DEPTH)

    # Fusion: union Pad002, Pad001, Base, Pad005, Pad007, Pad008, Pad006
    add(pad002.part)
    add(pad001.part)
    add(base.part)
    add(pad005.part)
    add(pad007.part)
    add(pad008.part)
    add(pad006.part)

    # Cut: cut Corte da tampa
    add(corte_da_tampa.part, mode=Mode.SUBTRACT)

    # Cut001: cut Pad009
    add(pad009.part, mode=Mode.SUBTRACT)

    # Cut002: cut Pad010
    add(pad010.part, mode=Mode.SUBTRACT)


with BuildPart() as fusion002:
    # Fusion001 base: copy of Pad011
    add(pad011.part)

    # Fusion001: union Cut002
    add(cut002.part)

    # Fusion002: union Fillet body
    add(fillet_body.part)


with BuildPart() as fillet001:
    # Fillet001 base: copy of Fusion002
    add(fusion002.part)

    # Fillet001
    fillet001_edges = [fillet001.edges().sort_by_distance(p)[0] for p in [
        (84, -27, 4),
        (80, -31, 5),
        (80, -31, 1),
        (43, -64, 4),
        (39, -60, 5),
        (39, -60, 1),
        (-4, -33, 4),
        (0, -29, 5),
        (0, -29, 1),
    ]]
    fillet(fillet001_edges, radius=FILLET001_R)


with BuildPart() as chamfer_body:
    # Fusion003 base: copy of Fusion002
    add(fusion002.part)

    # Fusion003: union Fillet001
    add(fillet001.part)

    # Cut003: cut Pad012
    add(pad012.part, mode=Mode.SUBTRACT)

    # Cut004: cut Parafusos
    add(parafusos.part, mode=Mode.SUBTRACT)

    # Chamfer
    chamfer_edges = [chamfer_body.edges().sort_by_distance(p)[0] for p in [
        (13, -25, 2),
        (63, -25, 2),
        (63, -50, 2),
        (13, -50, 2),
    ]]
    chamfer(chamfer_edges, length=CHAMFER_SIZE)


solid = Compound([tampa.part, chamfer_body.part])
